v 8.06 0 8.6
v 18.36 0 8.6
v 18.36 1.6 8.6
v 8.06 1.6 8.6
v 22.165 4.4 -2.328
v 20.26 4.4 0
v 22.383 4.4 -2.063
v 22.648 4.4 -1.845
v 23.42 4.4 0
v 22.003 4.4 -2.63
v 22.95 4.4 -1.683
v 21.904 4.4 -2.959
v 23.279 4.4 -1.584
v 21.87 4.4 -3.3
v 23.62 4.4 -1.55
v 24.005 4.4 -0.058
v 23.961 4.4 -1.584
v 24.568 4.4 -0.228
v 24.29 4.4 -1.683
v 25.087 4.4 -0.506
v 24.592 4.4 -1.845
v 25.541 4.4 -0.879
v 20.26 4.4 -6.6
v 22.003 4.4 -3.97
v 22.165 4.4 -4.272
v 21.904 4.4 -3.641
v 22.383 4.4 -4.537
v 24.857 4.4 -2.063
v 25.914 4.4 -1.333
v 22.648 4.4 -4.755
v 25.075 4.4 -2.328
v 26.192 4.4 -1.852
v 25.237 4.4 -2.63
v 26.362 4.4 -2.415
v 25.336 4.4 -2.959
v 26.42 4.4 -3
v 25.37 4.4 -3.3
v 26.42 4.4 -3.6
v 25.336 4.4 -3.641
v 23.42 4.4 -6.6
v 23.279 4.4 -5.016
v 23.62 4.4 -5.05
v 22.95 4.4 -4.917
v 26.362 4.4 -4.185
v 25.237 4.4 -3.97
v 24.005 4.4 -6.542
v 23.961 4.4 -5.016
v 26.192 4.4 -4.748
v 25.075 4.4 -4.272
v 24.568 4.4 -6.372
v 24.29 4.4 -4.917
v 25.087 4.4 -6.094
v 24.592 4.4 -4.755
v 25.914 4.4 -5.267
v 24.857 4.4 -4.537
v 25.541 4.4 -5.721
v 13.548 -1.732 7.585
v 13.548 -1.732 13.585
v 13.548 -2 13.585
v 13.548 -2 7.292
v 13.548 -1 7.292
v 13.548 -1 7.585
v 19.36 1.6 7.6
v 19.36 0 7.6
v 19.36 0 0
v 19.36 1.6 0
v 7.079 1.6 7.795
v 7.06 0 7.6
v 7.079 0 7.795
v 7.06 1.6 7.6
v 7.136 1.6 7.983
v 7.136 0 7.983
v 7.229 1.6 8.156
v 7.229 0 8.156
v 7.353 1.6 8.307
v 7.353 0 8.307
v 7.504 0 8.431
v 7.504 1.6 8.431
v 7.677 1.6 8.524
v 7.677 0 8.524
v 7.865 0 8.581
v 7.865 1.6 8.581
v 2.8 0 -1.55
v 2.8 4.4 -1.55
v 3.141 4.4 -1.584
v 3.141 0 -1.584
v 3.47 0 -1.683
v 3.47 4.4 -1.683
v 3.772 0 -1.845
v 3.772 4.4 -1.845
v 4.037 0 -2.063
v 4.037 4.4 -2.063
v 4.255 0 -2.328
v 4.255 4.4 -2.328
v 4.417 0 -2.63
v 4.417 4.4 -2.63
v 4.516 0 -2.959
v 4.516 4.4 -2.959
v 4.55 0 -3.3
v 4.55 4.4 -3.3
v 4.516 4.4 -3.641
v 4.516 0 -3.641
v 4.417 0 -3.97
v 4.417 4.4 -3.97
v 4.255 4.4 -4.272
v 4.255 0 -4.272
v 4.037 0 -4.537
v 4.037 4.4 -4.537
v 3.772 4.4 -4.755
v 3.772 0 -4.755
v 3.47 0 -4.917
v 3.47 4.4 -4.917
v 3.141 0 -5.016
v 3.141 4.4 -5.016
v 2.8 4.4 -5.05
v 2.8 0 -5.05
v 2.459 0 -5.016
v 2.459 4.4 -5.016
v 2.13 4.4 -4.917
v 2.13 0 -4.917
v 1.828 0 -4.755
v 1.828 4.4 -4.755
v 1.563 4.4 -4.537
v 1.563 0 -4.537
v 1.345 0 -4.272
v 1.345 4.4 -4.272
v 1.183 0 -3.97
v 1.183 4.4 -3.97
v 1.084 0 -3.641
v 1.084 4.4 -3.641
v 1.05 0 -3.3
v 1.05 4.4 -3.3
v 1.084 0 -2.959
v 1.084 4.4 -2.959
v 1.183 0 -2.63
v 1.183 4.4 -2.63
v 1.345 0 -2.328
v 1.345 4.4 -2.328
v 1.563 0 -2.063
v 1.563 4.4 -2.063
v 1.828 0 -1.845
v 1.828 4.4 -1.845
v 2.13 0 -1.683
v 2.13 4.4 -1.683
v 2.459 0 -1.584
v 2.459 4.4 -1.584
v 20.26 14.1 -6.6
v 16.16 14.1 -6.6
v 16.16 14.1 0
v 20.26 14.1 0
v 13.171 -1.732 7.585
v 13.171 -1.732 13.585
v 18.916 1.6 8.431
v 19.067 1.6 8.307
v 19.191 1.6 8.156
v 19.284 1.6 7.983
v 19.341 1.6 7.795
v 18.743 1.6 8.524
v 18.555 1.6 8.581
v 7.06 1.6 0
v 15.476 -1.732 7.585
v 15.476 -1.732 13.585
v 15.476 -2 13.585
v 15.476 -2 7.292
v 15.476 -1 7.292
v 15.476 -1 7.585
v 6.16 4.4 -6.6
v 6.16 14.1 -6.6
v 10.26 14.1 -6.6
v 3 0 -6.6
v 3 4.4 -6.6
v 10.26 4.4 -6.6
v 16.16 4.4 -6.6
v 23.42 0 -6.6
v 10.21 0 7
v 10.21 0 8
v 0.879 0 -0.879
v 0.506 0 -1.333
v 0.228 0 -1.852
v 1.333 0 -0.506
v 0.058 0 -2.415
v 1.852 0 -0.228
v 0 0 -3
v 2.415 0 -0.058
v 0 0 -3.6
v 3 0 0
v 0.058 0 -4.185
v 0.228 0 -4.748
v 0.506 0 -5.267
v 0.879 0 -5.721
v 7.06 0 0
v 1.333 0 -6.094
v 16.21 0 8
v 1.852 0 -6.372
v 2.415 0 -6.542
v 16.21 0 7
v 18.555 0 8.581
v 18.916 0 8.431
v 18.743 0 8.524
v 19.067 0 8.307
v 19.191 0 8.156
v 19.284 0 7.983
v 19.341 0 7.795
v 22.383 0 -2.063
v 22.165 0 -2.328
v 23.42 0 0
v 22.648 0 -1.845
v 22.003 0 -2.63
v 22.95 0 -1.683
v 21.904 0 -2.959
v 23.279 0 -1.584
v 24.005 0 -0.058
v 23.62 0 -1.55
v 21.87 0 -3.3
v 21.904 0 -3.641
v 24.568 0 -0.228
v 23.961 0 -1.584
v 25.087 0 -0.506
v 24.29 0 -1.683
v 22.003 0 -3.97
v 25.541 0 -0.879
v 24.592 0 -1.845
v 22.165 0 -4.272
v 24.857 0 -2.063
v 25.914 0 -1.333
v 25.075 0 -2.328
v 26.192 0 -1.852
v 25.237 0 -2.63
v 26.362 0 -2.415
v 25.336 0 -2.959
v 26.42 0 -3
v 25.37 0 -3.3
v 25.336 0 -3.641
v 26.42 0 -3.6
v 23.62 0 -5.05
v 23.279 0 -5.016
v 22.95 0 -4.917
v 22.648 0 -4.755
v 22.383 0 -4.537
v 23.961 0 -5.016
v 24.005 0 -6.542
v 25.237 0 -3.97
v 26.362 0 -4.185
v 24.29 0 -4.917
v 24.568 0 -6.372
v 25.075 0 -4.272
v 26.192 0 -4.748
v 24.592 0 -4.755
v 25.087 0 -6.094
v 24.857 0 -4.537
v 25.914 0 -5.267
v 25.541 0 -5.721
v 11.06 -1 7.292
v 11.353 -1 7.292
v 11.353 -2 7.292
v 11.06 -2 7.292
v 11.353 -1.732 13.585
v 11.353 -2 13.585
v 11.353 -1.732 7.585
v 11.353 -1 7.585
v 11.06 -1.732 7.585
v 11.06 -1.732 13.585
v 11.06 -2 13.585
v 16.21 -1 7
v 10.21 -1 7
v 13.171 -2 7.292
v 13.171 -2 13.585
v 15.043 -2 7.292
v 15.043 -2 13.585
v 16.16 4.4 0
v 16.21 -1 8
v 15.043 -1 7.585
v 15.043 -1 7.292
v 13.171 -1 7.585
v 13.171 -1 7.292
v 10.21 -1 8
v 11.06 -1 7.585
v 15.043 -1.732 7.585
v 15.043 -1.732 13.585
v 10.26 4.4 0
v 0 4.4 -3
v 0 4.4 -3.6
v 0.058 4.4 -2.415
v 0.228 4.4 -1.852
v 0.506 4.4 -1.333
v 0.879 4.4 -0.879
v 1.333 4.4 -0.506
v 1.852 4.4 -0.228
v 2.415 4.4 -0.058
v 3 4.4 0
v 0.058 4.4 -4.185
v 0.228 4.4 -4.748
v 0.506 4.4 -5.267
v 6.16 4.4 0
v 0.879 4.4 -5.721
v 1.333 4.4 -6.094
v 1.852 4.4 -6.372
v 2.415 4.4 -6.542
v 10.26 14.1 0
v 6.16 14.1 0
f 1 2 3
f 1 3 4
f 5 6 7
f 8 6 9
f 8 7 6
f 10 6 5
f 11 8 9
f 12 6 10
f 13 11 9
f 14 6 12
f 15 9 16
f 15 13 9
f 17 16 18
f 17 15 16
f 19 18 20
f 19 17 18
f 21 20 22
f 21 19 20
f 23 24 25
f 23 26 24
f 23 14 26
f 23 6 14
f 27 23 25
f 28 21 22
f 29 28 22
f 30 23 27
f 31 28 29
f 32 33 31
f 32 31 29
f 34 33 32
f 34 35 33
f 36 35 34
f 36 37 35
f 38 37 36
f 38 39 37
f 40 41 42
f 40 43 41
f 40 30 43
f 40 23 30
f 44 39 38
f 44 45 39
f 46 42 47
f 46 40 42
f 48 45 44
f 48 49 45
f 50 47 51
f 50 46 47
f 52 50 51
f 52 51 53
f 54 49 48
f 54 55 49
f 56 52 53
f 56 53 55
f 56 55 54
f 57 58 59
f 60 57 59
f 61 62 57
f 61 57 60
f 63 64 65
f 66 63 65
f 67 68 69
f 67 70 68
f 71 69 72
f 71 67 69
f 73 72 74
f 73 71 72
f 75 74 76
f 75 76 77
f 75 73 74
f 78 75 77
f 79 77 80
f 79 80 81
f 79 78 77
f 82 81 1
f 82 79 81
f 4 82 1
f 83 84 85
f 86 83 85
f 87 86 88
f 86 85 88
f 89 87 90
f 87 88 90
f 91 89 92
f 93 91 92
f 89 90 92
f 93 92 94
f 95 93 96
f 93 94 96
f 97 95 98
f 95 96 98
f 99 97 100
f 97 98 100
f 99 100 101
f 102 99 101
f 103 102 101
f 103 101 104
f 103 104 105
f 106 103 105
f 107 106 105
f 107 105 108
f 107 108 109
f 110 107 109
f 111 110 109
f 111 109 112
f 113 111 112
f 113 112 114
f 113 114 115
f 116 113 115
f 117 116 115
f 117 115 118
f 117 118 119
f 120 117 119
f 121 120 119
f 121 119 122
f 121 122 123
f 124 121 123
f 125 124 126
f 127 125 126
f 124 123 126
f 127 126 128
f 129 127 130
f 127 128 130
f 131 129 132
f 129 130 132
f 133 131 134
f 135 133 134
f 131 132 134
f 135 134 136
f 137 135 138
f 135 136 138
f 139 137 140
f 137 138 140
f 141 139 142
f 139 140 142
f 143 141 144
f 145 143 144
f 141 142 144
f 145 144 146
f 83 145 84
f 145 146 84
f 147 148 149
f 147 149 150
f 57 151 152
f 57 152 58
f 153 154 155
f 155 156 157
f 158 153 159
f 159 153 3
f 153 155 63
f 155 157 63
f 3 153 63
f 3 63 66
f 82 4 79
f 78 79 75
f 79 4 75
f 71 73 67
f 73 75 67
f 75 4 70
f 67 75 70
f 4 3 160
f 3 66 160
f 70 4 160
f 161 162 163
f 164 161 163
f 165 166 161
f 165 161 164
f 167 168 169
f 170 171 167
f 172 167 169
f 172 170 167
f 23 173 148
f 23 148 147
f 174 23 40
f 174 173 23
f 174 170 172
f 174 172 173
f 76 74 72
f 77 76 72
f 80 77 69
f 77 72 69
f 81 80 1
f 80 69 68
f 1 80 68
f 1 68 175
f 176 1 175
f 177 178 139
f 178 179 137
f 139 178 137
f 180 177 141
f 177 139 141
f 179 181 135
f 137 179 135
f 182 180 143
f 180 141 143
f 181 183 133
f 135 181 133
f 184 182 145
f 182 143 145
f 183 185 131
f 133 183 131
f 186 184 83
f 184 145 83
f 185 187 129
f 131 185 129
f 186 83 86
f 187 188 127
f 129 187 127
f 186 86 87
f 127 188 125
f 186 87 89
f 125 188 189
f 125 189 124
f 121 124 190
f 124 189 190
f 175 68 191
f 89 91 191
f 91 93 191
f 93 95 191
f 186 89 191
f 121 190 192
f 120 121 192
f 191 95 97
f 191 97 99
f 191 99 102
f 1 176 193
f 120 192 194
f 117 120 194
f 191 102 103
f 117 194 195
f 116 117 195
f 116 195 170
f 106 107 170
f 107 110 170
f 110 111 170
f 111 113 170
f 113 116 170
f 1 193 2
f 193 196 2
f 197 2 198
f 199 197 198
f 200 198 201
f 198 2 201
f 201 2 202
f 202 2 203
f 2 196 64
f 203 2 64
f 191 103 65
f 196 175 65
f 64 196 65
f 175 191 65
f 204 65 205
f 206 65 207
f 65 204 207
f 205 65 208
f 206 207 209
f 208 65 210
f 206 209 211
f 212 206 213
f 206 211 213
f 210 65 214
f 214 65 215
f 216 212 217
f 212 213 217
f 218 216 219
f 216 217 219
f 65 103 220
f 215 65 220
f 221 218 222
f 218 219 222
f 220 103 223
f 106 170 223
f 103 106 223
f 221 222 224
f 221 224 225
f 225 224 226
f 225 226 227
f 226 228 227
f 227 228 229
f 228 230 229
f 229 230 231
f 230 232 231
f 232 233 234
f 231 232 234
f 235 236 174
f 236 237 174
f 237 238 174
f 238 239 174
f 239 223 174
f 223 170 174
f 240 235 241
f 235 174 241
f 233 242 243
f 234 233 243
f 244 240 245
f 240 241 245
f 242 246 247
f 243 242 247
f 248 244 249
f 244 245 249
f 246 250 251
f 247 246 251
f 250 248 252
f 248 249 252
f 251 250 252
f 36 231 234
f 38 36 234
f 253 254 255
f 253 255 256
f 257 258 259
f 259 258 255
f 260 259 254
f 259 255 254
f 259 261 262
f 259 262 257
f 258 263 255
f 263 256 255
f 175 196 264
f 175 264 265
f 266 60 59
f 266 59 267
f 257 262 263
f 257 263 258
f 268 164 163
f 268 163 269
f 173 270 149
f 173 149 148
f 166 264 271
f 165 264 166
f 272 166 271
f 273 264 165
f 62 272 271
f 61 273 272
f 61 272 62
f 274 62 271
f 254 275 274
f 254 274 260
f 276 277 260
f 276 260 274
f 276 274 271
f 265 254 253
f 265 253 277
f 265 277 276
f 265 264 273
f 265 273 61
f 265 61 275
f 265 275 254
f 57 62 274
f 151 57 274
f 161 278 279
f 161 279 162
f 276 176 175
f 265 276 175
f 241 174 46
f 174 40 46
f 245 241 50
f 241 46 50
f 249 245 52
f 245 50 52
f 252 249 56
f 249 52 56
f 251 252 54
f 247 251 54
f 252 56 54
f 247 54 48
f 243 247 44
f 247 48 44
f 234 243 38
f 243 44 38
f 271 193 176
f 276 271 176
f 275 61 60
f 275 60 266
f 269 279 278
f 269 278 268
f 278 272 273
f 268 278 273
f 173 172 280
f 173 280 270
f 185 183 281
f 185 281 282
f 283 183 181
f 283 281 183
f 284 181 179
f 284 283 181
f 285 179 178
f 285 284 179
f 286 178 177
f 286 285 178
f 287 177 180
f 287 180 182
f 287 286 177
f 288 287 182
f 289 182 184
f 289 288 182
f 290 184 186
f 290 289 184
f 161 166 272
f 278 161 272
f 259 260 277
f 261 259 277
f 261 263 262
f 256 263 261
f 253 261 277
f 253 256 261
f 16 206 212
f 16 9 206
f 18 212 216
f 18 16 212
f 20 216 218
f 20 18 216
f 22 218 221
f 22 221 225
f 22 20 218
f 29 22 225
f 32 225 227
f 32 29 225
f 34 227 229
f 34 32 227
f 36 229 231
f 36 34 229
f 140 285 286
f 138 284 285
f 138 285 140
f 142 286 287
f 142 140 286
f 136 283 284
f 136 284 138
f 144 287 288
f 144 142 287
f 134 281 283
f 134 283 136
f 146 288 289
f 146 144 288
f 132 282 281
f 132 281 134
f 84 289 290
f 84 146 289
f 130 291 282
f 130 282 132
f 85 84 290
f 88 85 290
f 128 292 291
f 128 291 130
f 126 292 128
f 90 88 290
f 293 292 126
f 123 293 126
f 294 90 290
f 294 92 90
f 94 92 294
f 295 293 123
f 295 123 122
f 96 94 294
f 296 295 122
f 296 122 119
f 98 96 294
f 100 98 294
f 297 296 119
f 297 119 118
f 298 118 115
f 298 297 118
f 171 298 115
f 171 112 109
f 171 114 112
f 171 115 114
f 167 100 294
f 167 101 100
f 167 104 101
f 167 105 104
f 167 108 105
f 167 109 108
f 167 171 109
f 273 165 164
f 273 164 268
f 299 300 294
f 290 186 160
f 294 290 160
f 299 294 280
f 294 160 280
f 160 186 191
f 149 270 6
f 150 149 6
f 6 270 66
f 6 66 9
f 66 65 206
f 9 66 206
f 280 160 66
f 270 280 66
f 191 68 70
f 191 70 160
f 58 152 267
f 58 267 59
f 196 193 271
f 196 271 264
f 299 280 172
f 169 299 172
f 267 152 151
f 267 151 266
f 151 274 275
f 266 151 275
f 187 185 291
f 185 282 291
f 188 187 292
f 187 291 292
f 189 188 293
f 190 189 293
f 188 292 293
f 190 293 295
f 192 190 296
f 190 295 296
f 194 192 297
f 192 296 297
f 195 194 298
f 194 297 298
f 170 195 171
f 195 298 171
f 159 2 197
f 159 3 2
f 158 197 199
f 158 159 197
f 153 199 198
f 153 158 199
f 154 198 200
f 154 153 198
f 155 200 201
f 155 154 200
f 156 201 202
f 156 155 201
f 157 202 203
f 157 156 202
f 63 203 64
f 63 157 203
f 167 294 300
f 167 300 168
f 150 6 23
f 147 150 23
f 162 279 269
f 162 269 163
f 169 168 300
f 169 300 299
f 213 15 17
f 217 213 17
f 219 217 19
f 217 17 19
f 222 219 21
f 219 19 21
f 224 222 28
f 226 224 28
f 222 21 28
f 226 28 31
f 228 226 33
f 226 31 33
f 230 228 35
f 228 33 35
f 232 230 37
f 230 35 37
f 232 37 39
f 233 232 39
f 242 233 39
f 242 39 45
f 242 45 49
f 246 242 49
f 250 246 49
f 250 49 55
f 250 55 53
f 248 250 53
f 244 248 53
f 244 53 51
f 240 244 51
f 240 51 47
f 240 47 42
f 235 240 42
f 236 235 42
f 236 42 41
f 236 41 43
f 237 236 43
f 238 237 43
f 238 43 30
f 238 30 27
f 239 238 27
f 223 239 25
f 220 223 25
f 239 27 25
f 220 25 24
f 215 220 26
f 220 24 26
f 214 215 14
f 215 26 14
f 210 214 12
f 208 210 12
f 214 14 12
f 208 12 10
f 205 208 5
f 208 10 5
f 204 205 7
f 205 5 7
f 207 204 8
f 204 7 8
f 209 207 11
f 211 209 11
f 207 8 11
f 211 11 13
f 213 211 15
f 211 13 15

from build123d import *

# Parameters (mm, degrees)
SKETCH_1_W          = 26.42
SKETCH_1_H          = 6.6
EXTRUDE_1_DEPTH     = 4.4
SKETCH_2_W          = 12.3
SKETCH_2_H          = 8.6
EXTRUDE_2_DEPTH     = 1.6
SKETCH_3_W          = 4.1
SKETCH_3_H          = 6.6
EXTRUDE_3_DEPTH     = 9.7
FILLET_1_R          = 3
FILLET_2_R          = 1
SKETCH_4_W          = 6
SKETCH_4_H          = 1
EXTRUDE_4_DEPTH     = 1
SKETCH_5_W          = 0.293200104
SKETCH_5_H          = 0.293200104
SKETCH_5_W_2        = 0.377208019
SKETCH_5_W_3        = 0.433090687
EXTRUDE_5_DEPTH     = 1
SKETCH_6_W          = 0.293200104
SKETCH_6_H          = 0.267980564
SKETCH_6_W_2        = 0.377208019
SKETCH_6_W_3        = 0.433090687
EXTRUDE_6_DEPTH     = 6
SKETCH_7_R          = 1.75
CUT_EXTRUDE_1_DEPTH = 6


with BuildPart() as part:
    # 草图1 → 凸台-拉伸1 (new body)
    with BuildSketch(Plane(origin=(0, 0, 0), x_dir=(1, 0, 0), z_dir=(0, 1, 0))):
        with Locations((13.21, 3.3)):
            Rectangle(SKETCH_1_W, SKETCH_1_H)
    extrude(amount=EXTRUDE_1_DEPTH)

    # 草图2 → 凸台-拉伸2 (add)
    with BuildSketch(Plane(origin=(0, 0, 0), x_dir=(-1, 0, 0), z_dir=(0, -1, 0))):
        with Locations((-13.21, -4.3)):
            Rectangle(SKETCH_2_W, SKETCH_2_H)
    extrude(amount=-EXTRUDE_2_DEPTH)

    # 草图3 → 凸台-拉伸3 (add)
    with BuildSketch(Plane(origin=(0, 4.4, 0), x_dir=(1, 0, 0), z_dir=(0, 1, 0))):
        with Locations((8.21, 3.3)):
            Rectangle(SKETCH_3_W, SKETCH_3_H)
        with Locations((18.21, 3.3)):
            Rectangle(SKETCH_3_W, SKETCH_3_H)
    extrude(amount=EXTRUDE_3_DEPTH)

    # 圆角1
    fillet_1_edges = [part.edges().sort_by_distance(p)[0] for p in [
        (0, 2.2, -6.6),
        (26.42, 2.2, -6.6),
        (26.42, 2.2, 0),
        (0, 2.2, 0),
    ]]
    fillet(fillet_1_edges, radius=FILLET_1_R)

    # 圆角2
    fillet_2_edges = [part.edges().sort_by_distance(p)[0] for p in [
        (7.06, 0.8, 8.6),
        (19.36, 0.8, 8.6),
    ]]
    fillet(fillet_2_edges, radius=FILLET_2_R)

    # 草图4 → 凸台-拉伸4 (add)
    with BuildSketch(Plane(origin=(0, 0, 0), x_dir=(-1, 0, 0), z_dir=(0, -1, 0))):
        with Locations((-13.21, -7.5)):
            Rectangle(SKETCH_4_W, SKETCH_4_H)
    extrude(amount=EXTRUDE_4_DEPTH)

    # 草图5 → 凸台-拉伸5 (add)
    with BuildSketch(Plane(origin=(0, -1, 0), x_dir=(-1, 0, 0), z_dir=(0, -1, 0))):
        with Locations((-11.206465954, -7.438185624)):
            Rectangle(SKETCH_5_W, SKETCH_5_H)
        with Locations((-13.359332723, -7.438185624)):
            Rectangle(SKETCH_5_W_2, SKETCH_5_H)
        with Locations((-15.259343482, -7.438185624)):
            Rectangle(SKETCH_5_W_3, SKETCH_5_H)
    extrude(amount=EXTRUDE_5_DEPTH)

    # 草图6 → 凸台-拉伸6 (add)
    with BuildSketch(Plane.XY.offset(7.584785676)):
        with Locations((11.206465954, -1.866009718)):
            Rectangle(SKETCH_6_W, SKETCH_6_H)
        with Locations((13.359332723, -1.866009718)):
            Rectangle(SKETCH_6_W_2, SKETCH_6_H)
        with Locations((15.259343482, -1.866009718)):
            Rectangle(SKETCH_6_W_3, SKETCH_6_H)
    extrude(amount=EXTRUDE_6_DEPTH)

    # 草图7 → 切除-拉伸1 (cut)
    with BuildSketch(Plane(origin=(0, 4.4, 0), x_dir=(1, 0, 0), z_dir=(0, 1, 0))):
        with Locations(Location((2.8, 3.3, 0), (0, 0, 270))):
            Circle(SKETCH_7_R)
        with Locations(Location((23.62, 3.3, 0), (0, 0, 270))):
            Circle(SKETCH_7_R)
    extrude(amount=-CUT_EXTRUDE_1_DEPTH, mode=Mode.SUBTRACT)


solid = part.part
